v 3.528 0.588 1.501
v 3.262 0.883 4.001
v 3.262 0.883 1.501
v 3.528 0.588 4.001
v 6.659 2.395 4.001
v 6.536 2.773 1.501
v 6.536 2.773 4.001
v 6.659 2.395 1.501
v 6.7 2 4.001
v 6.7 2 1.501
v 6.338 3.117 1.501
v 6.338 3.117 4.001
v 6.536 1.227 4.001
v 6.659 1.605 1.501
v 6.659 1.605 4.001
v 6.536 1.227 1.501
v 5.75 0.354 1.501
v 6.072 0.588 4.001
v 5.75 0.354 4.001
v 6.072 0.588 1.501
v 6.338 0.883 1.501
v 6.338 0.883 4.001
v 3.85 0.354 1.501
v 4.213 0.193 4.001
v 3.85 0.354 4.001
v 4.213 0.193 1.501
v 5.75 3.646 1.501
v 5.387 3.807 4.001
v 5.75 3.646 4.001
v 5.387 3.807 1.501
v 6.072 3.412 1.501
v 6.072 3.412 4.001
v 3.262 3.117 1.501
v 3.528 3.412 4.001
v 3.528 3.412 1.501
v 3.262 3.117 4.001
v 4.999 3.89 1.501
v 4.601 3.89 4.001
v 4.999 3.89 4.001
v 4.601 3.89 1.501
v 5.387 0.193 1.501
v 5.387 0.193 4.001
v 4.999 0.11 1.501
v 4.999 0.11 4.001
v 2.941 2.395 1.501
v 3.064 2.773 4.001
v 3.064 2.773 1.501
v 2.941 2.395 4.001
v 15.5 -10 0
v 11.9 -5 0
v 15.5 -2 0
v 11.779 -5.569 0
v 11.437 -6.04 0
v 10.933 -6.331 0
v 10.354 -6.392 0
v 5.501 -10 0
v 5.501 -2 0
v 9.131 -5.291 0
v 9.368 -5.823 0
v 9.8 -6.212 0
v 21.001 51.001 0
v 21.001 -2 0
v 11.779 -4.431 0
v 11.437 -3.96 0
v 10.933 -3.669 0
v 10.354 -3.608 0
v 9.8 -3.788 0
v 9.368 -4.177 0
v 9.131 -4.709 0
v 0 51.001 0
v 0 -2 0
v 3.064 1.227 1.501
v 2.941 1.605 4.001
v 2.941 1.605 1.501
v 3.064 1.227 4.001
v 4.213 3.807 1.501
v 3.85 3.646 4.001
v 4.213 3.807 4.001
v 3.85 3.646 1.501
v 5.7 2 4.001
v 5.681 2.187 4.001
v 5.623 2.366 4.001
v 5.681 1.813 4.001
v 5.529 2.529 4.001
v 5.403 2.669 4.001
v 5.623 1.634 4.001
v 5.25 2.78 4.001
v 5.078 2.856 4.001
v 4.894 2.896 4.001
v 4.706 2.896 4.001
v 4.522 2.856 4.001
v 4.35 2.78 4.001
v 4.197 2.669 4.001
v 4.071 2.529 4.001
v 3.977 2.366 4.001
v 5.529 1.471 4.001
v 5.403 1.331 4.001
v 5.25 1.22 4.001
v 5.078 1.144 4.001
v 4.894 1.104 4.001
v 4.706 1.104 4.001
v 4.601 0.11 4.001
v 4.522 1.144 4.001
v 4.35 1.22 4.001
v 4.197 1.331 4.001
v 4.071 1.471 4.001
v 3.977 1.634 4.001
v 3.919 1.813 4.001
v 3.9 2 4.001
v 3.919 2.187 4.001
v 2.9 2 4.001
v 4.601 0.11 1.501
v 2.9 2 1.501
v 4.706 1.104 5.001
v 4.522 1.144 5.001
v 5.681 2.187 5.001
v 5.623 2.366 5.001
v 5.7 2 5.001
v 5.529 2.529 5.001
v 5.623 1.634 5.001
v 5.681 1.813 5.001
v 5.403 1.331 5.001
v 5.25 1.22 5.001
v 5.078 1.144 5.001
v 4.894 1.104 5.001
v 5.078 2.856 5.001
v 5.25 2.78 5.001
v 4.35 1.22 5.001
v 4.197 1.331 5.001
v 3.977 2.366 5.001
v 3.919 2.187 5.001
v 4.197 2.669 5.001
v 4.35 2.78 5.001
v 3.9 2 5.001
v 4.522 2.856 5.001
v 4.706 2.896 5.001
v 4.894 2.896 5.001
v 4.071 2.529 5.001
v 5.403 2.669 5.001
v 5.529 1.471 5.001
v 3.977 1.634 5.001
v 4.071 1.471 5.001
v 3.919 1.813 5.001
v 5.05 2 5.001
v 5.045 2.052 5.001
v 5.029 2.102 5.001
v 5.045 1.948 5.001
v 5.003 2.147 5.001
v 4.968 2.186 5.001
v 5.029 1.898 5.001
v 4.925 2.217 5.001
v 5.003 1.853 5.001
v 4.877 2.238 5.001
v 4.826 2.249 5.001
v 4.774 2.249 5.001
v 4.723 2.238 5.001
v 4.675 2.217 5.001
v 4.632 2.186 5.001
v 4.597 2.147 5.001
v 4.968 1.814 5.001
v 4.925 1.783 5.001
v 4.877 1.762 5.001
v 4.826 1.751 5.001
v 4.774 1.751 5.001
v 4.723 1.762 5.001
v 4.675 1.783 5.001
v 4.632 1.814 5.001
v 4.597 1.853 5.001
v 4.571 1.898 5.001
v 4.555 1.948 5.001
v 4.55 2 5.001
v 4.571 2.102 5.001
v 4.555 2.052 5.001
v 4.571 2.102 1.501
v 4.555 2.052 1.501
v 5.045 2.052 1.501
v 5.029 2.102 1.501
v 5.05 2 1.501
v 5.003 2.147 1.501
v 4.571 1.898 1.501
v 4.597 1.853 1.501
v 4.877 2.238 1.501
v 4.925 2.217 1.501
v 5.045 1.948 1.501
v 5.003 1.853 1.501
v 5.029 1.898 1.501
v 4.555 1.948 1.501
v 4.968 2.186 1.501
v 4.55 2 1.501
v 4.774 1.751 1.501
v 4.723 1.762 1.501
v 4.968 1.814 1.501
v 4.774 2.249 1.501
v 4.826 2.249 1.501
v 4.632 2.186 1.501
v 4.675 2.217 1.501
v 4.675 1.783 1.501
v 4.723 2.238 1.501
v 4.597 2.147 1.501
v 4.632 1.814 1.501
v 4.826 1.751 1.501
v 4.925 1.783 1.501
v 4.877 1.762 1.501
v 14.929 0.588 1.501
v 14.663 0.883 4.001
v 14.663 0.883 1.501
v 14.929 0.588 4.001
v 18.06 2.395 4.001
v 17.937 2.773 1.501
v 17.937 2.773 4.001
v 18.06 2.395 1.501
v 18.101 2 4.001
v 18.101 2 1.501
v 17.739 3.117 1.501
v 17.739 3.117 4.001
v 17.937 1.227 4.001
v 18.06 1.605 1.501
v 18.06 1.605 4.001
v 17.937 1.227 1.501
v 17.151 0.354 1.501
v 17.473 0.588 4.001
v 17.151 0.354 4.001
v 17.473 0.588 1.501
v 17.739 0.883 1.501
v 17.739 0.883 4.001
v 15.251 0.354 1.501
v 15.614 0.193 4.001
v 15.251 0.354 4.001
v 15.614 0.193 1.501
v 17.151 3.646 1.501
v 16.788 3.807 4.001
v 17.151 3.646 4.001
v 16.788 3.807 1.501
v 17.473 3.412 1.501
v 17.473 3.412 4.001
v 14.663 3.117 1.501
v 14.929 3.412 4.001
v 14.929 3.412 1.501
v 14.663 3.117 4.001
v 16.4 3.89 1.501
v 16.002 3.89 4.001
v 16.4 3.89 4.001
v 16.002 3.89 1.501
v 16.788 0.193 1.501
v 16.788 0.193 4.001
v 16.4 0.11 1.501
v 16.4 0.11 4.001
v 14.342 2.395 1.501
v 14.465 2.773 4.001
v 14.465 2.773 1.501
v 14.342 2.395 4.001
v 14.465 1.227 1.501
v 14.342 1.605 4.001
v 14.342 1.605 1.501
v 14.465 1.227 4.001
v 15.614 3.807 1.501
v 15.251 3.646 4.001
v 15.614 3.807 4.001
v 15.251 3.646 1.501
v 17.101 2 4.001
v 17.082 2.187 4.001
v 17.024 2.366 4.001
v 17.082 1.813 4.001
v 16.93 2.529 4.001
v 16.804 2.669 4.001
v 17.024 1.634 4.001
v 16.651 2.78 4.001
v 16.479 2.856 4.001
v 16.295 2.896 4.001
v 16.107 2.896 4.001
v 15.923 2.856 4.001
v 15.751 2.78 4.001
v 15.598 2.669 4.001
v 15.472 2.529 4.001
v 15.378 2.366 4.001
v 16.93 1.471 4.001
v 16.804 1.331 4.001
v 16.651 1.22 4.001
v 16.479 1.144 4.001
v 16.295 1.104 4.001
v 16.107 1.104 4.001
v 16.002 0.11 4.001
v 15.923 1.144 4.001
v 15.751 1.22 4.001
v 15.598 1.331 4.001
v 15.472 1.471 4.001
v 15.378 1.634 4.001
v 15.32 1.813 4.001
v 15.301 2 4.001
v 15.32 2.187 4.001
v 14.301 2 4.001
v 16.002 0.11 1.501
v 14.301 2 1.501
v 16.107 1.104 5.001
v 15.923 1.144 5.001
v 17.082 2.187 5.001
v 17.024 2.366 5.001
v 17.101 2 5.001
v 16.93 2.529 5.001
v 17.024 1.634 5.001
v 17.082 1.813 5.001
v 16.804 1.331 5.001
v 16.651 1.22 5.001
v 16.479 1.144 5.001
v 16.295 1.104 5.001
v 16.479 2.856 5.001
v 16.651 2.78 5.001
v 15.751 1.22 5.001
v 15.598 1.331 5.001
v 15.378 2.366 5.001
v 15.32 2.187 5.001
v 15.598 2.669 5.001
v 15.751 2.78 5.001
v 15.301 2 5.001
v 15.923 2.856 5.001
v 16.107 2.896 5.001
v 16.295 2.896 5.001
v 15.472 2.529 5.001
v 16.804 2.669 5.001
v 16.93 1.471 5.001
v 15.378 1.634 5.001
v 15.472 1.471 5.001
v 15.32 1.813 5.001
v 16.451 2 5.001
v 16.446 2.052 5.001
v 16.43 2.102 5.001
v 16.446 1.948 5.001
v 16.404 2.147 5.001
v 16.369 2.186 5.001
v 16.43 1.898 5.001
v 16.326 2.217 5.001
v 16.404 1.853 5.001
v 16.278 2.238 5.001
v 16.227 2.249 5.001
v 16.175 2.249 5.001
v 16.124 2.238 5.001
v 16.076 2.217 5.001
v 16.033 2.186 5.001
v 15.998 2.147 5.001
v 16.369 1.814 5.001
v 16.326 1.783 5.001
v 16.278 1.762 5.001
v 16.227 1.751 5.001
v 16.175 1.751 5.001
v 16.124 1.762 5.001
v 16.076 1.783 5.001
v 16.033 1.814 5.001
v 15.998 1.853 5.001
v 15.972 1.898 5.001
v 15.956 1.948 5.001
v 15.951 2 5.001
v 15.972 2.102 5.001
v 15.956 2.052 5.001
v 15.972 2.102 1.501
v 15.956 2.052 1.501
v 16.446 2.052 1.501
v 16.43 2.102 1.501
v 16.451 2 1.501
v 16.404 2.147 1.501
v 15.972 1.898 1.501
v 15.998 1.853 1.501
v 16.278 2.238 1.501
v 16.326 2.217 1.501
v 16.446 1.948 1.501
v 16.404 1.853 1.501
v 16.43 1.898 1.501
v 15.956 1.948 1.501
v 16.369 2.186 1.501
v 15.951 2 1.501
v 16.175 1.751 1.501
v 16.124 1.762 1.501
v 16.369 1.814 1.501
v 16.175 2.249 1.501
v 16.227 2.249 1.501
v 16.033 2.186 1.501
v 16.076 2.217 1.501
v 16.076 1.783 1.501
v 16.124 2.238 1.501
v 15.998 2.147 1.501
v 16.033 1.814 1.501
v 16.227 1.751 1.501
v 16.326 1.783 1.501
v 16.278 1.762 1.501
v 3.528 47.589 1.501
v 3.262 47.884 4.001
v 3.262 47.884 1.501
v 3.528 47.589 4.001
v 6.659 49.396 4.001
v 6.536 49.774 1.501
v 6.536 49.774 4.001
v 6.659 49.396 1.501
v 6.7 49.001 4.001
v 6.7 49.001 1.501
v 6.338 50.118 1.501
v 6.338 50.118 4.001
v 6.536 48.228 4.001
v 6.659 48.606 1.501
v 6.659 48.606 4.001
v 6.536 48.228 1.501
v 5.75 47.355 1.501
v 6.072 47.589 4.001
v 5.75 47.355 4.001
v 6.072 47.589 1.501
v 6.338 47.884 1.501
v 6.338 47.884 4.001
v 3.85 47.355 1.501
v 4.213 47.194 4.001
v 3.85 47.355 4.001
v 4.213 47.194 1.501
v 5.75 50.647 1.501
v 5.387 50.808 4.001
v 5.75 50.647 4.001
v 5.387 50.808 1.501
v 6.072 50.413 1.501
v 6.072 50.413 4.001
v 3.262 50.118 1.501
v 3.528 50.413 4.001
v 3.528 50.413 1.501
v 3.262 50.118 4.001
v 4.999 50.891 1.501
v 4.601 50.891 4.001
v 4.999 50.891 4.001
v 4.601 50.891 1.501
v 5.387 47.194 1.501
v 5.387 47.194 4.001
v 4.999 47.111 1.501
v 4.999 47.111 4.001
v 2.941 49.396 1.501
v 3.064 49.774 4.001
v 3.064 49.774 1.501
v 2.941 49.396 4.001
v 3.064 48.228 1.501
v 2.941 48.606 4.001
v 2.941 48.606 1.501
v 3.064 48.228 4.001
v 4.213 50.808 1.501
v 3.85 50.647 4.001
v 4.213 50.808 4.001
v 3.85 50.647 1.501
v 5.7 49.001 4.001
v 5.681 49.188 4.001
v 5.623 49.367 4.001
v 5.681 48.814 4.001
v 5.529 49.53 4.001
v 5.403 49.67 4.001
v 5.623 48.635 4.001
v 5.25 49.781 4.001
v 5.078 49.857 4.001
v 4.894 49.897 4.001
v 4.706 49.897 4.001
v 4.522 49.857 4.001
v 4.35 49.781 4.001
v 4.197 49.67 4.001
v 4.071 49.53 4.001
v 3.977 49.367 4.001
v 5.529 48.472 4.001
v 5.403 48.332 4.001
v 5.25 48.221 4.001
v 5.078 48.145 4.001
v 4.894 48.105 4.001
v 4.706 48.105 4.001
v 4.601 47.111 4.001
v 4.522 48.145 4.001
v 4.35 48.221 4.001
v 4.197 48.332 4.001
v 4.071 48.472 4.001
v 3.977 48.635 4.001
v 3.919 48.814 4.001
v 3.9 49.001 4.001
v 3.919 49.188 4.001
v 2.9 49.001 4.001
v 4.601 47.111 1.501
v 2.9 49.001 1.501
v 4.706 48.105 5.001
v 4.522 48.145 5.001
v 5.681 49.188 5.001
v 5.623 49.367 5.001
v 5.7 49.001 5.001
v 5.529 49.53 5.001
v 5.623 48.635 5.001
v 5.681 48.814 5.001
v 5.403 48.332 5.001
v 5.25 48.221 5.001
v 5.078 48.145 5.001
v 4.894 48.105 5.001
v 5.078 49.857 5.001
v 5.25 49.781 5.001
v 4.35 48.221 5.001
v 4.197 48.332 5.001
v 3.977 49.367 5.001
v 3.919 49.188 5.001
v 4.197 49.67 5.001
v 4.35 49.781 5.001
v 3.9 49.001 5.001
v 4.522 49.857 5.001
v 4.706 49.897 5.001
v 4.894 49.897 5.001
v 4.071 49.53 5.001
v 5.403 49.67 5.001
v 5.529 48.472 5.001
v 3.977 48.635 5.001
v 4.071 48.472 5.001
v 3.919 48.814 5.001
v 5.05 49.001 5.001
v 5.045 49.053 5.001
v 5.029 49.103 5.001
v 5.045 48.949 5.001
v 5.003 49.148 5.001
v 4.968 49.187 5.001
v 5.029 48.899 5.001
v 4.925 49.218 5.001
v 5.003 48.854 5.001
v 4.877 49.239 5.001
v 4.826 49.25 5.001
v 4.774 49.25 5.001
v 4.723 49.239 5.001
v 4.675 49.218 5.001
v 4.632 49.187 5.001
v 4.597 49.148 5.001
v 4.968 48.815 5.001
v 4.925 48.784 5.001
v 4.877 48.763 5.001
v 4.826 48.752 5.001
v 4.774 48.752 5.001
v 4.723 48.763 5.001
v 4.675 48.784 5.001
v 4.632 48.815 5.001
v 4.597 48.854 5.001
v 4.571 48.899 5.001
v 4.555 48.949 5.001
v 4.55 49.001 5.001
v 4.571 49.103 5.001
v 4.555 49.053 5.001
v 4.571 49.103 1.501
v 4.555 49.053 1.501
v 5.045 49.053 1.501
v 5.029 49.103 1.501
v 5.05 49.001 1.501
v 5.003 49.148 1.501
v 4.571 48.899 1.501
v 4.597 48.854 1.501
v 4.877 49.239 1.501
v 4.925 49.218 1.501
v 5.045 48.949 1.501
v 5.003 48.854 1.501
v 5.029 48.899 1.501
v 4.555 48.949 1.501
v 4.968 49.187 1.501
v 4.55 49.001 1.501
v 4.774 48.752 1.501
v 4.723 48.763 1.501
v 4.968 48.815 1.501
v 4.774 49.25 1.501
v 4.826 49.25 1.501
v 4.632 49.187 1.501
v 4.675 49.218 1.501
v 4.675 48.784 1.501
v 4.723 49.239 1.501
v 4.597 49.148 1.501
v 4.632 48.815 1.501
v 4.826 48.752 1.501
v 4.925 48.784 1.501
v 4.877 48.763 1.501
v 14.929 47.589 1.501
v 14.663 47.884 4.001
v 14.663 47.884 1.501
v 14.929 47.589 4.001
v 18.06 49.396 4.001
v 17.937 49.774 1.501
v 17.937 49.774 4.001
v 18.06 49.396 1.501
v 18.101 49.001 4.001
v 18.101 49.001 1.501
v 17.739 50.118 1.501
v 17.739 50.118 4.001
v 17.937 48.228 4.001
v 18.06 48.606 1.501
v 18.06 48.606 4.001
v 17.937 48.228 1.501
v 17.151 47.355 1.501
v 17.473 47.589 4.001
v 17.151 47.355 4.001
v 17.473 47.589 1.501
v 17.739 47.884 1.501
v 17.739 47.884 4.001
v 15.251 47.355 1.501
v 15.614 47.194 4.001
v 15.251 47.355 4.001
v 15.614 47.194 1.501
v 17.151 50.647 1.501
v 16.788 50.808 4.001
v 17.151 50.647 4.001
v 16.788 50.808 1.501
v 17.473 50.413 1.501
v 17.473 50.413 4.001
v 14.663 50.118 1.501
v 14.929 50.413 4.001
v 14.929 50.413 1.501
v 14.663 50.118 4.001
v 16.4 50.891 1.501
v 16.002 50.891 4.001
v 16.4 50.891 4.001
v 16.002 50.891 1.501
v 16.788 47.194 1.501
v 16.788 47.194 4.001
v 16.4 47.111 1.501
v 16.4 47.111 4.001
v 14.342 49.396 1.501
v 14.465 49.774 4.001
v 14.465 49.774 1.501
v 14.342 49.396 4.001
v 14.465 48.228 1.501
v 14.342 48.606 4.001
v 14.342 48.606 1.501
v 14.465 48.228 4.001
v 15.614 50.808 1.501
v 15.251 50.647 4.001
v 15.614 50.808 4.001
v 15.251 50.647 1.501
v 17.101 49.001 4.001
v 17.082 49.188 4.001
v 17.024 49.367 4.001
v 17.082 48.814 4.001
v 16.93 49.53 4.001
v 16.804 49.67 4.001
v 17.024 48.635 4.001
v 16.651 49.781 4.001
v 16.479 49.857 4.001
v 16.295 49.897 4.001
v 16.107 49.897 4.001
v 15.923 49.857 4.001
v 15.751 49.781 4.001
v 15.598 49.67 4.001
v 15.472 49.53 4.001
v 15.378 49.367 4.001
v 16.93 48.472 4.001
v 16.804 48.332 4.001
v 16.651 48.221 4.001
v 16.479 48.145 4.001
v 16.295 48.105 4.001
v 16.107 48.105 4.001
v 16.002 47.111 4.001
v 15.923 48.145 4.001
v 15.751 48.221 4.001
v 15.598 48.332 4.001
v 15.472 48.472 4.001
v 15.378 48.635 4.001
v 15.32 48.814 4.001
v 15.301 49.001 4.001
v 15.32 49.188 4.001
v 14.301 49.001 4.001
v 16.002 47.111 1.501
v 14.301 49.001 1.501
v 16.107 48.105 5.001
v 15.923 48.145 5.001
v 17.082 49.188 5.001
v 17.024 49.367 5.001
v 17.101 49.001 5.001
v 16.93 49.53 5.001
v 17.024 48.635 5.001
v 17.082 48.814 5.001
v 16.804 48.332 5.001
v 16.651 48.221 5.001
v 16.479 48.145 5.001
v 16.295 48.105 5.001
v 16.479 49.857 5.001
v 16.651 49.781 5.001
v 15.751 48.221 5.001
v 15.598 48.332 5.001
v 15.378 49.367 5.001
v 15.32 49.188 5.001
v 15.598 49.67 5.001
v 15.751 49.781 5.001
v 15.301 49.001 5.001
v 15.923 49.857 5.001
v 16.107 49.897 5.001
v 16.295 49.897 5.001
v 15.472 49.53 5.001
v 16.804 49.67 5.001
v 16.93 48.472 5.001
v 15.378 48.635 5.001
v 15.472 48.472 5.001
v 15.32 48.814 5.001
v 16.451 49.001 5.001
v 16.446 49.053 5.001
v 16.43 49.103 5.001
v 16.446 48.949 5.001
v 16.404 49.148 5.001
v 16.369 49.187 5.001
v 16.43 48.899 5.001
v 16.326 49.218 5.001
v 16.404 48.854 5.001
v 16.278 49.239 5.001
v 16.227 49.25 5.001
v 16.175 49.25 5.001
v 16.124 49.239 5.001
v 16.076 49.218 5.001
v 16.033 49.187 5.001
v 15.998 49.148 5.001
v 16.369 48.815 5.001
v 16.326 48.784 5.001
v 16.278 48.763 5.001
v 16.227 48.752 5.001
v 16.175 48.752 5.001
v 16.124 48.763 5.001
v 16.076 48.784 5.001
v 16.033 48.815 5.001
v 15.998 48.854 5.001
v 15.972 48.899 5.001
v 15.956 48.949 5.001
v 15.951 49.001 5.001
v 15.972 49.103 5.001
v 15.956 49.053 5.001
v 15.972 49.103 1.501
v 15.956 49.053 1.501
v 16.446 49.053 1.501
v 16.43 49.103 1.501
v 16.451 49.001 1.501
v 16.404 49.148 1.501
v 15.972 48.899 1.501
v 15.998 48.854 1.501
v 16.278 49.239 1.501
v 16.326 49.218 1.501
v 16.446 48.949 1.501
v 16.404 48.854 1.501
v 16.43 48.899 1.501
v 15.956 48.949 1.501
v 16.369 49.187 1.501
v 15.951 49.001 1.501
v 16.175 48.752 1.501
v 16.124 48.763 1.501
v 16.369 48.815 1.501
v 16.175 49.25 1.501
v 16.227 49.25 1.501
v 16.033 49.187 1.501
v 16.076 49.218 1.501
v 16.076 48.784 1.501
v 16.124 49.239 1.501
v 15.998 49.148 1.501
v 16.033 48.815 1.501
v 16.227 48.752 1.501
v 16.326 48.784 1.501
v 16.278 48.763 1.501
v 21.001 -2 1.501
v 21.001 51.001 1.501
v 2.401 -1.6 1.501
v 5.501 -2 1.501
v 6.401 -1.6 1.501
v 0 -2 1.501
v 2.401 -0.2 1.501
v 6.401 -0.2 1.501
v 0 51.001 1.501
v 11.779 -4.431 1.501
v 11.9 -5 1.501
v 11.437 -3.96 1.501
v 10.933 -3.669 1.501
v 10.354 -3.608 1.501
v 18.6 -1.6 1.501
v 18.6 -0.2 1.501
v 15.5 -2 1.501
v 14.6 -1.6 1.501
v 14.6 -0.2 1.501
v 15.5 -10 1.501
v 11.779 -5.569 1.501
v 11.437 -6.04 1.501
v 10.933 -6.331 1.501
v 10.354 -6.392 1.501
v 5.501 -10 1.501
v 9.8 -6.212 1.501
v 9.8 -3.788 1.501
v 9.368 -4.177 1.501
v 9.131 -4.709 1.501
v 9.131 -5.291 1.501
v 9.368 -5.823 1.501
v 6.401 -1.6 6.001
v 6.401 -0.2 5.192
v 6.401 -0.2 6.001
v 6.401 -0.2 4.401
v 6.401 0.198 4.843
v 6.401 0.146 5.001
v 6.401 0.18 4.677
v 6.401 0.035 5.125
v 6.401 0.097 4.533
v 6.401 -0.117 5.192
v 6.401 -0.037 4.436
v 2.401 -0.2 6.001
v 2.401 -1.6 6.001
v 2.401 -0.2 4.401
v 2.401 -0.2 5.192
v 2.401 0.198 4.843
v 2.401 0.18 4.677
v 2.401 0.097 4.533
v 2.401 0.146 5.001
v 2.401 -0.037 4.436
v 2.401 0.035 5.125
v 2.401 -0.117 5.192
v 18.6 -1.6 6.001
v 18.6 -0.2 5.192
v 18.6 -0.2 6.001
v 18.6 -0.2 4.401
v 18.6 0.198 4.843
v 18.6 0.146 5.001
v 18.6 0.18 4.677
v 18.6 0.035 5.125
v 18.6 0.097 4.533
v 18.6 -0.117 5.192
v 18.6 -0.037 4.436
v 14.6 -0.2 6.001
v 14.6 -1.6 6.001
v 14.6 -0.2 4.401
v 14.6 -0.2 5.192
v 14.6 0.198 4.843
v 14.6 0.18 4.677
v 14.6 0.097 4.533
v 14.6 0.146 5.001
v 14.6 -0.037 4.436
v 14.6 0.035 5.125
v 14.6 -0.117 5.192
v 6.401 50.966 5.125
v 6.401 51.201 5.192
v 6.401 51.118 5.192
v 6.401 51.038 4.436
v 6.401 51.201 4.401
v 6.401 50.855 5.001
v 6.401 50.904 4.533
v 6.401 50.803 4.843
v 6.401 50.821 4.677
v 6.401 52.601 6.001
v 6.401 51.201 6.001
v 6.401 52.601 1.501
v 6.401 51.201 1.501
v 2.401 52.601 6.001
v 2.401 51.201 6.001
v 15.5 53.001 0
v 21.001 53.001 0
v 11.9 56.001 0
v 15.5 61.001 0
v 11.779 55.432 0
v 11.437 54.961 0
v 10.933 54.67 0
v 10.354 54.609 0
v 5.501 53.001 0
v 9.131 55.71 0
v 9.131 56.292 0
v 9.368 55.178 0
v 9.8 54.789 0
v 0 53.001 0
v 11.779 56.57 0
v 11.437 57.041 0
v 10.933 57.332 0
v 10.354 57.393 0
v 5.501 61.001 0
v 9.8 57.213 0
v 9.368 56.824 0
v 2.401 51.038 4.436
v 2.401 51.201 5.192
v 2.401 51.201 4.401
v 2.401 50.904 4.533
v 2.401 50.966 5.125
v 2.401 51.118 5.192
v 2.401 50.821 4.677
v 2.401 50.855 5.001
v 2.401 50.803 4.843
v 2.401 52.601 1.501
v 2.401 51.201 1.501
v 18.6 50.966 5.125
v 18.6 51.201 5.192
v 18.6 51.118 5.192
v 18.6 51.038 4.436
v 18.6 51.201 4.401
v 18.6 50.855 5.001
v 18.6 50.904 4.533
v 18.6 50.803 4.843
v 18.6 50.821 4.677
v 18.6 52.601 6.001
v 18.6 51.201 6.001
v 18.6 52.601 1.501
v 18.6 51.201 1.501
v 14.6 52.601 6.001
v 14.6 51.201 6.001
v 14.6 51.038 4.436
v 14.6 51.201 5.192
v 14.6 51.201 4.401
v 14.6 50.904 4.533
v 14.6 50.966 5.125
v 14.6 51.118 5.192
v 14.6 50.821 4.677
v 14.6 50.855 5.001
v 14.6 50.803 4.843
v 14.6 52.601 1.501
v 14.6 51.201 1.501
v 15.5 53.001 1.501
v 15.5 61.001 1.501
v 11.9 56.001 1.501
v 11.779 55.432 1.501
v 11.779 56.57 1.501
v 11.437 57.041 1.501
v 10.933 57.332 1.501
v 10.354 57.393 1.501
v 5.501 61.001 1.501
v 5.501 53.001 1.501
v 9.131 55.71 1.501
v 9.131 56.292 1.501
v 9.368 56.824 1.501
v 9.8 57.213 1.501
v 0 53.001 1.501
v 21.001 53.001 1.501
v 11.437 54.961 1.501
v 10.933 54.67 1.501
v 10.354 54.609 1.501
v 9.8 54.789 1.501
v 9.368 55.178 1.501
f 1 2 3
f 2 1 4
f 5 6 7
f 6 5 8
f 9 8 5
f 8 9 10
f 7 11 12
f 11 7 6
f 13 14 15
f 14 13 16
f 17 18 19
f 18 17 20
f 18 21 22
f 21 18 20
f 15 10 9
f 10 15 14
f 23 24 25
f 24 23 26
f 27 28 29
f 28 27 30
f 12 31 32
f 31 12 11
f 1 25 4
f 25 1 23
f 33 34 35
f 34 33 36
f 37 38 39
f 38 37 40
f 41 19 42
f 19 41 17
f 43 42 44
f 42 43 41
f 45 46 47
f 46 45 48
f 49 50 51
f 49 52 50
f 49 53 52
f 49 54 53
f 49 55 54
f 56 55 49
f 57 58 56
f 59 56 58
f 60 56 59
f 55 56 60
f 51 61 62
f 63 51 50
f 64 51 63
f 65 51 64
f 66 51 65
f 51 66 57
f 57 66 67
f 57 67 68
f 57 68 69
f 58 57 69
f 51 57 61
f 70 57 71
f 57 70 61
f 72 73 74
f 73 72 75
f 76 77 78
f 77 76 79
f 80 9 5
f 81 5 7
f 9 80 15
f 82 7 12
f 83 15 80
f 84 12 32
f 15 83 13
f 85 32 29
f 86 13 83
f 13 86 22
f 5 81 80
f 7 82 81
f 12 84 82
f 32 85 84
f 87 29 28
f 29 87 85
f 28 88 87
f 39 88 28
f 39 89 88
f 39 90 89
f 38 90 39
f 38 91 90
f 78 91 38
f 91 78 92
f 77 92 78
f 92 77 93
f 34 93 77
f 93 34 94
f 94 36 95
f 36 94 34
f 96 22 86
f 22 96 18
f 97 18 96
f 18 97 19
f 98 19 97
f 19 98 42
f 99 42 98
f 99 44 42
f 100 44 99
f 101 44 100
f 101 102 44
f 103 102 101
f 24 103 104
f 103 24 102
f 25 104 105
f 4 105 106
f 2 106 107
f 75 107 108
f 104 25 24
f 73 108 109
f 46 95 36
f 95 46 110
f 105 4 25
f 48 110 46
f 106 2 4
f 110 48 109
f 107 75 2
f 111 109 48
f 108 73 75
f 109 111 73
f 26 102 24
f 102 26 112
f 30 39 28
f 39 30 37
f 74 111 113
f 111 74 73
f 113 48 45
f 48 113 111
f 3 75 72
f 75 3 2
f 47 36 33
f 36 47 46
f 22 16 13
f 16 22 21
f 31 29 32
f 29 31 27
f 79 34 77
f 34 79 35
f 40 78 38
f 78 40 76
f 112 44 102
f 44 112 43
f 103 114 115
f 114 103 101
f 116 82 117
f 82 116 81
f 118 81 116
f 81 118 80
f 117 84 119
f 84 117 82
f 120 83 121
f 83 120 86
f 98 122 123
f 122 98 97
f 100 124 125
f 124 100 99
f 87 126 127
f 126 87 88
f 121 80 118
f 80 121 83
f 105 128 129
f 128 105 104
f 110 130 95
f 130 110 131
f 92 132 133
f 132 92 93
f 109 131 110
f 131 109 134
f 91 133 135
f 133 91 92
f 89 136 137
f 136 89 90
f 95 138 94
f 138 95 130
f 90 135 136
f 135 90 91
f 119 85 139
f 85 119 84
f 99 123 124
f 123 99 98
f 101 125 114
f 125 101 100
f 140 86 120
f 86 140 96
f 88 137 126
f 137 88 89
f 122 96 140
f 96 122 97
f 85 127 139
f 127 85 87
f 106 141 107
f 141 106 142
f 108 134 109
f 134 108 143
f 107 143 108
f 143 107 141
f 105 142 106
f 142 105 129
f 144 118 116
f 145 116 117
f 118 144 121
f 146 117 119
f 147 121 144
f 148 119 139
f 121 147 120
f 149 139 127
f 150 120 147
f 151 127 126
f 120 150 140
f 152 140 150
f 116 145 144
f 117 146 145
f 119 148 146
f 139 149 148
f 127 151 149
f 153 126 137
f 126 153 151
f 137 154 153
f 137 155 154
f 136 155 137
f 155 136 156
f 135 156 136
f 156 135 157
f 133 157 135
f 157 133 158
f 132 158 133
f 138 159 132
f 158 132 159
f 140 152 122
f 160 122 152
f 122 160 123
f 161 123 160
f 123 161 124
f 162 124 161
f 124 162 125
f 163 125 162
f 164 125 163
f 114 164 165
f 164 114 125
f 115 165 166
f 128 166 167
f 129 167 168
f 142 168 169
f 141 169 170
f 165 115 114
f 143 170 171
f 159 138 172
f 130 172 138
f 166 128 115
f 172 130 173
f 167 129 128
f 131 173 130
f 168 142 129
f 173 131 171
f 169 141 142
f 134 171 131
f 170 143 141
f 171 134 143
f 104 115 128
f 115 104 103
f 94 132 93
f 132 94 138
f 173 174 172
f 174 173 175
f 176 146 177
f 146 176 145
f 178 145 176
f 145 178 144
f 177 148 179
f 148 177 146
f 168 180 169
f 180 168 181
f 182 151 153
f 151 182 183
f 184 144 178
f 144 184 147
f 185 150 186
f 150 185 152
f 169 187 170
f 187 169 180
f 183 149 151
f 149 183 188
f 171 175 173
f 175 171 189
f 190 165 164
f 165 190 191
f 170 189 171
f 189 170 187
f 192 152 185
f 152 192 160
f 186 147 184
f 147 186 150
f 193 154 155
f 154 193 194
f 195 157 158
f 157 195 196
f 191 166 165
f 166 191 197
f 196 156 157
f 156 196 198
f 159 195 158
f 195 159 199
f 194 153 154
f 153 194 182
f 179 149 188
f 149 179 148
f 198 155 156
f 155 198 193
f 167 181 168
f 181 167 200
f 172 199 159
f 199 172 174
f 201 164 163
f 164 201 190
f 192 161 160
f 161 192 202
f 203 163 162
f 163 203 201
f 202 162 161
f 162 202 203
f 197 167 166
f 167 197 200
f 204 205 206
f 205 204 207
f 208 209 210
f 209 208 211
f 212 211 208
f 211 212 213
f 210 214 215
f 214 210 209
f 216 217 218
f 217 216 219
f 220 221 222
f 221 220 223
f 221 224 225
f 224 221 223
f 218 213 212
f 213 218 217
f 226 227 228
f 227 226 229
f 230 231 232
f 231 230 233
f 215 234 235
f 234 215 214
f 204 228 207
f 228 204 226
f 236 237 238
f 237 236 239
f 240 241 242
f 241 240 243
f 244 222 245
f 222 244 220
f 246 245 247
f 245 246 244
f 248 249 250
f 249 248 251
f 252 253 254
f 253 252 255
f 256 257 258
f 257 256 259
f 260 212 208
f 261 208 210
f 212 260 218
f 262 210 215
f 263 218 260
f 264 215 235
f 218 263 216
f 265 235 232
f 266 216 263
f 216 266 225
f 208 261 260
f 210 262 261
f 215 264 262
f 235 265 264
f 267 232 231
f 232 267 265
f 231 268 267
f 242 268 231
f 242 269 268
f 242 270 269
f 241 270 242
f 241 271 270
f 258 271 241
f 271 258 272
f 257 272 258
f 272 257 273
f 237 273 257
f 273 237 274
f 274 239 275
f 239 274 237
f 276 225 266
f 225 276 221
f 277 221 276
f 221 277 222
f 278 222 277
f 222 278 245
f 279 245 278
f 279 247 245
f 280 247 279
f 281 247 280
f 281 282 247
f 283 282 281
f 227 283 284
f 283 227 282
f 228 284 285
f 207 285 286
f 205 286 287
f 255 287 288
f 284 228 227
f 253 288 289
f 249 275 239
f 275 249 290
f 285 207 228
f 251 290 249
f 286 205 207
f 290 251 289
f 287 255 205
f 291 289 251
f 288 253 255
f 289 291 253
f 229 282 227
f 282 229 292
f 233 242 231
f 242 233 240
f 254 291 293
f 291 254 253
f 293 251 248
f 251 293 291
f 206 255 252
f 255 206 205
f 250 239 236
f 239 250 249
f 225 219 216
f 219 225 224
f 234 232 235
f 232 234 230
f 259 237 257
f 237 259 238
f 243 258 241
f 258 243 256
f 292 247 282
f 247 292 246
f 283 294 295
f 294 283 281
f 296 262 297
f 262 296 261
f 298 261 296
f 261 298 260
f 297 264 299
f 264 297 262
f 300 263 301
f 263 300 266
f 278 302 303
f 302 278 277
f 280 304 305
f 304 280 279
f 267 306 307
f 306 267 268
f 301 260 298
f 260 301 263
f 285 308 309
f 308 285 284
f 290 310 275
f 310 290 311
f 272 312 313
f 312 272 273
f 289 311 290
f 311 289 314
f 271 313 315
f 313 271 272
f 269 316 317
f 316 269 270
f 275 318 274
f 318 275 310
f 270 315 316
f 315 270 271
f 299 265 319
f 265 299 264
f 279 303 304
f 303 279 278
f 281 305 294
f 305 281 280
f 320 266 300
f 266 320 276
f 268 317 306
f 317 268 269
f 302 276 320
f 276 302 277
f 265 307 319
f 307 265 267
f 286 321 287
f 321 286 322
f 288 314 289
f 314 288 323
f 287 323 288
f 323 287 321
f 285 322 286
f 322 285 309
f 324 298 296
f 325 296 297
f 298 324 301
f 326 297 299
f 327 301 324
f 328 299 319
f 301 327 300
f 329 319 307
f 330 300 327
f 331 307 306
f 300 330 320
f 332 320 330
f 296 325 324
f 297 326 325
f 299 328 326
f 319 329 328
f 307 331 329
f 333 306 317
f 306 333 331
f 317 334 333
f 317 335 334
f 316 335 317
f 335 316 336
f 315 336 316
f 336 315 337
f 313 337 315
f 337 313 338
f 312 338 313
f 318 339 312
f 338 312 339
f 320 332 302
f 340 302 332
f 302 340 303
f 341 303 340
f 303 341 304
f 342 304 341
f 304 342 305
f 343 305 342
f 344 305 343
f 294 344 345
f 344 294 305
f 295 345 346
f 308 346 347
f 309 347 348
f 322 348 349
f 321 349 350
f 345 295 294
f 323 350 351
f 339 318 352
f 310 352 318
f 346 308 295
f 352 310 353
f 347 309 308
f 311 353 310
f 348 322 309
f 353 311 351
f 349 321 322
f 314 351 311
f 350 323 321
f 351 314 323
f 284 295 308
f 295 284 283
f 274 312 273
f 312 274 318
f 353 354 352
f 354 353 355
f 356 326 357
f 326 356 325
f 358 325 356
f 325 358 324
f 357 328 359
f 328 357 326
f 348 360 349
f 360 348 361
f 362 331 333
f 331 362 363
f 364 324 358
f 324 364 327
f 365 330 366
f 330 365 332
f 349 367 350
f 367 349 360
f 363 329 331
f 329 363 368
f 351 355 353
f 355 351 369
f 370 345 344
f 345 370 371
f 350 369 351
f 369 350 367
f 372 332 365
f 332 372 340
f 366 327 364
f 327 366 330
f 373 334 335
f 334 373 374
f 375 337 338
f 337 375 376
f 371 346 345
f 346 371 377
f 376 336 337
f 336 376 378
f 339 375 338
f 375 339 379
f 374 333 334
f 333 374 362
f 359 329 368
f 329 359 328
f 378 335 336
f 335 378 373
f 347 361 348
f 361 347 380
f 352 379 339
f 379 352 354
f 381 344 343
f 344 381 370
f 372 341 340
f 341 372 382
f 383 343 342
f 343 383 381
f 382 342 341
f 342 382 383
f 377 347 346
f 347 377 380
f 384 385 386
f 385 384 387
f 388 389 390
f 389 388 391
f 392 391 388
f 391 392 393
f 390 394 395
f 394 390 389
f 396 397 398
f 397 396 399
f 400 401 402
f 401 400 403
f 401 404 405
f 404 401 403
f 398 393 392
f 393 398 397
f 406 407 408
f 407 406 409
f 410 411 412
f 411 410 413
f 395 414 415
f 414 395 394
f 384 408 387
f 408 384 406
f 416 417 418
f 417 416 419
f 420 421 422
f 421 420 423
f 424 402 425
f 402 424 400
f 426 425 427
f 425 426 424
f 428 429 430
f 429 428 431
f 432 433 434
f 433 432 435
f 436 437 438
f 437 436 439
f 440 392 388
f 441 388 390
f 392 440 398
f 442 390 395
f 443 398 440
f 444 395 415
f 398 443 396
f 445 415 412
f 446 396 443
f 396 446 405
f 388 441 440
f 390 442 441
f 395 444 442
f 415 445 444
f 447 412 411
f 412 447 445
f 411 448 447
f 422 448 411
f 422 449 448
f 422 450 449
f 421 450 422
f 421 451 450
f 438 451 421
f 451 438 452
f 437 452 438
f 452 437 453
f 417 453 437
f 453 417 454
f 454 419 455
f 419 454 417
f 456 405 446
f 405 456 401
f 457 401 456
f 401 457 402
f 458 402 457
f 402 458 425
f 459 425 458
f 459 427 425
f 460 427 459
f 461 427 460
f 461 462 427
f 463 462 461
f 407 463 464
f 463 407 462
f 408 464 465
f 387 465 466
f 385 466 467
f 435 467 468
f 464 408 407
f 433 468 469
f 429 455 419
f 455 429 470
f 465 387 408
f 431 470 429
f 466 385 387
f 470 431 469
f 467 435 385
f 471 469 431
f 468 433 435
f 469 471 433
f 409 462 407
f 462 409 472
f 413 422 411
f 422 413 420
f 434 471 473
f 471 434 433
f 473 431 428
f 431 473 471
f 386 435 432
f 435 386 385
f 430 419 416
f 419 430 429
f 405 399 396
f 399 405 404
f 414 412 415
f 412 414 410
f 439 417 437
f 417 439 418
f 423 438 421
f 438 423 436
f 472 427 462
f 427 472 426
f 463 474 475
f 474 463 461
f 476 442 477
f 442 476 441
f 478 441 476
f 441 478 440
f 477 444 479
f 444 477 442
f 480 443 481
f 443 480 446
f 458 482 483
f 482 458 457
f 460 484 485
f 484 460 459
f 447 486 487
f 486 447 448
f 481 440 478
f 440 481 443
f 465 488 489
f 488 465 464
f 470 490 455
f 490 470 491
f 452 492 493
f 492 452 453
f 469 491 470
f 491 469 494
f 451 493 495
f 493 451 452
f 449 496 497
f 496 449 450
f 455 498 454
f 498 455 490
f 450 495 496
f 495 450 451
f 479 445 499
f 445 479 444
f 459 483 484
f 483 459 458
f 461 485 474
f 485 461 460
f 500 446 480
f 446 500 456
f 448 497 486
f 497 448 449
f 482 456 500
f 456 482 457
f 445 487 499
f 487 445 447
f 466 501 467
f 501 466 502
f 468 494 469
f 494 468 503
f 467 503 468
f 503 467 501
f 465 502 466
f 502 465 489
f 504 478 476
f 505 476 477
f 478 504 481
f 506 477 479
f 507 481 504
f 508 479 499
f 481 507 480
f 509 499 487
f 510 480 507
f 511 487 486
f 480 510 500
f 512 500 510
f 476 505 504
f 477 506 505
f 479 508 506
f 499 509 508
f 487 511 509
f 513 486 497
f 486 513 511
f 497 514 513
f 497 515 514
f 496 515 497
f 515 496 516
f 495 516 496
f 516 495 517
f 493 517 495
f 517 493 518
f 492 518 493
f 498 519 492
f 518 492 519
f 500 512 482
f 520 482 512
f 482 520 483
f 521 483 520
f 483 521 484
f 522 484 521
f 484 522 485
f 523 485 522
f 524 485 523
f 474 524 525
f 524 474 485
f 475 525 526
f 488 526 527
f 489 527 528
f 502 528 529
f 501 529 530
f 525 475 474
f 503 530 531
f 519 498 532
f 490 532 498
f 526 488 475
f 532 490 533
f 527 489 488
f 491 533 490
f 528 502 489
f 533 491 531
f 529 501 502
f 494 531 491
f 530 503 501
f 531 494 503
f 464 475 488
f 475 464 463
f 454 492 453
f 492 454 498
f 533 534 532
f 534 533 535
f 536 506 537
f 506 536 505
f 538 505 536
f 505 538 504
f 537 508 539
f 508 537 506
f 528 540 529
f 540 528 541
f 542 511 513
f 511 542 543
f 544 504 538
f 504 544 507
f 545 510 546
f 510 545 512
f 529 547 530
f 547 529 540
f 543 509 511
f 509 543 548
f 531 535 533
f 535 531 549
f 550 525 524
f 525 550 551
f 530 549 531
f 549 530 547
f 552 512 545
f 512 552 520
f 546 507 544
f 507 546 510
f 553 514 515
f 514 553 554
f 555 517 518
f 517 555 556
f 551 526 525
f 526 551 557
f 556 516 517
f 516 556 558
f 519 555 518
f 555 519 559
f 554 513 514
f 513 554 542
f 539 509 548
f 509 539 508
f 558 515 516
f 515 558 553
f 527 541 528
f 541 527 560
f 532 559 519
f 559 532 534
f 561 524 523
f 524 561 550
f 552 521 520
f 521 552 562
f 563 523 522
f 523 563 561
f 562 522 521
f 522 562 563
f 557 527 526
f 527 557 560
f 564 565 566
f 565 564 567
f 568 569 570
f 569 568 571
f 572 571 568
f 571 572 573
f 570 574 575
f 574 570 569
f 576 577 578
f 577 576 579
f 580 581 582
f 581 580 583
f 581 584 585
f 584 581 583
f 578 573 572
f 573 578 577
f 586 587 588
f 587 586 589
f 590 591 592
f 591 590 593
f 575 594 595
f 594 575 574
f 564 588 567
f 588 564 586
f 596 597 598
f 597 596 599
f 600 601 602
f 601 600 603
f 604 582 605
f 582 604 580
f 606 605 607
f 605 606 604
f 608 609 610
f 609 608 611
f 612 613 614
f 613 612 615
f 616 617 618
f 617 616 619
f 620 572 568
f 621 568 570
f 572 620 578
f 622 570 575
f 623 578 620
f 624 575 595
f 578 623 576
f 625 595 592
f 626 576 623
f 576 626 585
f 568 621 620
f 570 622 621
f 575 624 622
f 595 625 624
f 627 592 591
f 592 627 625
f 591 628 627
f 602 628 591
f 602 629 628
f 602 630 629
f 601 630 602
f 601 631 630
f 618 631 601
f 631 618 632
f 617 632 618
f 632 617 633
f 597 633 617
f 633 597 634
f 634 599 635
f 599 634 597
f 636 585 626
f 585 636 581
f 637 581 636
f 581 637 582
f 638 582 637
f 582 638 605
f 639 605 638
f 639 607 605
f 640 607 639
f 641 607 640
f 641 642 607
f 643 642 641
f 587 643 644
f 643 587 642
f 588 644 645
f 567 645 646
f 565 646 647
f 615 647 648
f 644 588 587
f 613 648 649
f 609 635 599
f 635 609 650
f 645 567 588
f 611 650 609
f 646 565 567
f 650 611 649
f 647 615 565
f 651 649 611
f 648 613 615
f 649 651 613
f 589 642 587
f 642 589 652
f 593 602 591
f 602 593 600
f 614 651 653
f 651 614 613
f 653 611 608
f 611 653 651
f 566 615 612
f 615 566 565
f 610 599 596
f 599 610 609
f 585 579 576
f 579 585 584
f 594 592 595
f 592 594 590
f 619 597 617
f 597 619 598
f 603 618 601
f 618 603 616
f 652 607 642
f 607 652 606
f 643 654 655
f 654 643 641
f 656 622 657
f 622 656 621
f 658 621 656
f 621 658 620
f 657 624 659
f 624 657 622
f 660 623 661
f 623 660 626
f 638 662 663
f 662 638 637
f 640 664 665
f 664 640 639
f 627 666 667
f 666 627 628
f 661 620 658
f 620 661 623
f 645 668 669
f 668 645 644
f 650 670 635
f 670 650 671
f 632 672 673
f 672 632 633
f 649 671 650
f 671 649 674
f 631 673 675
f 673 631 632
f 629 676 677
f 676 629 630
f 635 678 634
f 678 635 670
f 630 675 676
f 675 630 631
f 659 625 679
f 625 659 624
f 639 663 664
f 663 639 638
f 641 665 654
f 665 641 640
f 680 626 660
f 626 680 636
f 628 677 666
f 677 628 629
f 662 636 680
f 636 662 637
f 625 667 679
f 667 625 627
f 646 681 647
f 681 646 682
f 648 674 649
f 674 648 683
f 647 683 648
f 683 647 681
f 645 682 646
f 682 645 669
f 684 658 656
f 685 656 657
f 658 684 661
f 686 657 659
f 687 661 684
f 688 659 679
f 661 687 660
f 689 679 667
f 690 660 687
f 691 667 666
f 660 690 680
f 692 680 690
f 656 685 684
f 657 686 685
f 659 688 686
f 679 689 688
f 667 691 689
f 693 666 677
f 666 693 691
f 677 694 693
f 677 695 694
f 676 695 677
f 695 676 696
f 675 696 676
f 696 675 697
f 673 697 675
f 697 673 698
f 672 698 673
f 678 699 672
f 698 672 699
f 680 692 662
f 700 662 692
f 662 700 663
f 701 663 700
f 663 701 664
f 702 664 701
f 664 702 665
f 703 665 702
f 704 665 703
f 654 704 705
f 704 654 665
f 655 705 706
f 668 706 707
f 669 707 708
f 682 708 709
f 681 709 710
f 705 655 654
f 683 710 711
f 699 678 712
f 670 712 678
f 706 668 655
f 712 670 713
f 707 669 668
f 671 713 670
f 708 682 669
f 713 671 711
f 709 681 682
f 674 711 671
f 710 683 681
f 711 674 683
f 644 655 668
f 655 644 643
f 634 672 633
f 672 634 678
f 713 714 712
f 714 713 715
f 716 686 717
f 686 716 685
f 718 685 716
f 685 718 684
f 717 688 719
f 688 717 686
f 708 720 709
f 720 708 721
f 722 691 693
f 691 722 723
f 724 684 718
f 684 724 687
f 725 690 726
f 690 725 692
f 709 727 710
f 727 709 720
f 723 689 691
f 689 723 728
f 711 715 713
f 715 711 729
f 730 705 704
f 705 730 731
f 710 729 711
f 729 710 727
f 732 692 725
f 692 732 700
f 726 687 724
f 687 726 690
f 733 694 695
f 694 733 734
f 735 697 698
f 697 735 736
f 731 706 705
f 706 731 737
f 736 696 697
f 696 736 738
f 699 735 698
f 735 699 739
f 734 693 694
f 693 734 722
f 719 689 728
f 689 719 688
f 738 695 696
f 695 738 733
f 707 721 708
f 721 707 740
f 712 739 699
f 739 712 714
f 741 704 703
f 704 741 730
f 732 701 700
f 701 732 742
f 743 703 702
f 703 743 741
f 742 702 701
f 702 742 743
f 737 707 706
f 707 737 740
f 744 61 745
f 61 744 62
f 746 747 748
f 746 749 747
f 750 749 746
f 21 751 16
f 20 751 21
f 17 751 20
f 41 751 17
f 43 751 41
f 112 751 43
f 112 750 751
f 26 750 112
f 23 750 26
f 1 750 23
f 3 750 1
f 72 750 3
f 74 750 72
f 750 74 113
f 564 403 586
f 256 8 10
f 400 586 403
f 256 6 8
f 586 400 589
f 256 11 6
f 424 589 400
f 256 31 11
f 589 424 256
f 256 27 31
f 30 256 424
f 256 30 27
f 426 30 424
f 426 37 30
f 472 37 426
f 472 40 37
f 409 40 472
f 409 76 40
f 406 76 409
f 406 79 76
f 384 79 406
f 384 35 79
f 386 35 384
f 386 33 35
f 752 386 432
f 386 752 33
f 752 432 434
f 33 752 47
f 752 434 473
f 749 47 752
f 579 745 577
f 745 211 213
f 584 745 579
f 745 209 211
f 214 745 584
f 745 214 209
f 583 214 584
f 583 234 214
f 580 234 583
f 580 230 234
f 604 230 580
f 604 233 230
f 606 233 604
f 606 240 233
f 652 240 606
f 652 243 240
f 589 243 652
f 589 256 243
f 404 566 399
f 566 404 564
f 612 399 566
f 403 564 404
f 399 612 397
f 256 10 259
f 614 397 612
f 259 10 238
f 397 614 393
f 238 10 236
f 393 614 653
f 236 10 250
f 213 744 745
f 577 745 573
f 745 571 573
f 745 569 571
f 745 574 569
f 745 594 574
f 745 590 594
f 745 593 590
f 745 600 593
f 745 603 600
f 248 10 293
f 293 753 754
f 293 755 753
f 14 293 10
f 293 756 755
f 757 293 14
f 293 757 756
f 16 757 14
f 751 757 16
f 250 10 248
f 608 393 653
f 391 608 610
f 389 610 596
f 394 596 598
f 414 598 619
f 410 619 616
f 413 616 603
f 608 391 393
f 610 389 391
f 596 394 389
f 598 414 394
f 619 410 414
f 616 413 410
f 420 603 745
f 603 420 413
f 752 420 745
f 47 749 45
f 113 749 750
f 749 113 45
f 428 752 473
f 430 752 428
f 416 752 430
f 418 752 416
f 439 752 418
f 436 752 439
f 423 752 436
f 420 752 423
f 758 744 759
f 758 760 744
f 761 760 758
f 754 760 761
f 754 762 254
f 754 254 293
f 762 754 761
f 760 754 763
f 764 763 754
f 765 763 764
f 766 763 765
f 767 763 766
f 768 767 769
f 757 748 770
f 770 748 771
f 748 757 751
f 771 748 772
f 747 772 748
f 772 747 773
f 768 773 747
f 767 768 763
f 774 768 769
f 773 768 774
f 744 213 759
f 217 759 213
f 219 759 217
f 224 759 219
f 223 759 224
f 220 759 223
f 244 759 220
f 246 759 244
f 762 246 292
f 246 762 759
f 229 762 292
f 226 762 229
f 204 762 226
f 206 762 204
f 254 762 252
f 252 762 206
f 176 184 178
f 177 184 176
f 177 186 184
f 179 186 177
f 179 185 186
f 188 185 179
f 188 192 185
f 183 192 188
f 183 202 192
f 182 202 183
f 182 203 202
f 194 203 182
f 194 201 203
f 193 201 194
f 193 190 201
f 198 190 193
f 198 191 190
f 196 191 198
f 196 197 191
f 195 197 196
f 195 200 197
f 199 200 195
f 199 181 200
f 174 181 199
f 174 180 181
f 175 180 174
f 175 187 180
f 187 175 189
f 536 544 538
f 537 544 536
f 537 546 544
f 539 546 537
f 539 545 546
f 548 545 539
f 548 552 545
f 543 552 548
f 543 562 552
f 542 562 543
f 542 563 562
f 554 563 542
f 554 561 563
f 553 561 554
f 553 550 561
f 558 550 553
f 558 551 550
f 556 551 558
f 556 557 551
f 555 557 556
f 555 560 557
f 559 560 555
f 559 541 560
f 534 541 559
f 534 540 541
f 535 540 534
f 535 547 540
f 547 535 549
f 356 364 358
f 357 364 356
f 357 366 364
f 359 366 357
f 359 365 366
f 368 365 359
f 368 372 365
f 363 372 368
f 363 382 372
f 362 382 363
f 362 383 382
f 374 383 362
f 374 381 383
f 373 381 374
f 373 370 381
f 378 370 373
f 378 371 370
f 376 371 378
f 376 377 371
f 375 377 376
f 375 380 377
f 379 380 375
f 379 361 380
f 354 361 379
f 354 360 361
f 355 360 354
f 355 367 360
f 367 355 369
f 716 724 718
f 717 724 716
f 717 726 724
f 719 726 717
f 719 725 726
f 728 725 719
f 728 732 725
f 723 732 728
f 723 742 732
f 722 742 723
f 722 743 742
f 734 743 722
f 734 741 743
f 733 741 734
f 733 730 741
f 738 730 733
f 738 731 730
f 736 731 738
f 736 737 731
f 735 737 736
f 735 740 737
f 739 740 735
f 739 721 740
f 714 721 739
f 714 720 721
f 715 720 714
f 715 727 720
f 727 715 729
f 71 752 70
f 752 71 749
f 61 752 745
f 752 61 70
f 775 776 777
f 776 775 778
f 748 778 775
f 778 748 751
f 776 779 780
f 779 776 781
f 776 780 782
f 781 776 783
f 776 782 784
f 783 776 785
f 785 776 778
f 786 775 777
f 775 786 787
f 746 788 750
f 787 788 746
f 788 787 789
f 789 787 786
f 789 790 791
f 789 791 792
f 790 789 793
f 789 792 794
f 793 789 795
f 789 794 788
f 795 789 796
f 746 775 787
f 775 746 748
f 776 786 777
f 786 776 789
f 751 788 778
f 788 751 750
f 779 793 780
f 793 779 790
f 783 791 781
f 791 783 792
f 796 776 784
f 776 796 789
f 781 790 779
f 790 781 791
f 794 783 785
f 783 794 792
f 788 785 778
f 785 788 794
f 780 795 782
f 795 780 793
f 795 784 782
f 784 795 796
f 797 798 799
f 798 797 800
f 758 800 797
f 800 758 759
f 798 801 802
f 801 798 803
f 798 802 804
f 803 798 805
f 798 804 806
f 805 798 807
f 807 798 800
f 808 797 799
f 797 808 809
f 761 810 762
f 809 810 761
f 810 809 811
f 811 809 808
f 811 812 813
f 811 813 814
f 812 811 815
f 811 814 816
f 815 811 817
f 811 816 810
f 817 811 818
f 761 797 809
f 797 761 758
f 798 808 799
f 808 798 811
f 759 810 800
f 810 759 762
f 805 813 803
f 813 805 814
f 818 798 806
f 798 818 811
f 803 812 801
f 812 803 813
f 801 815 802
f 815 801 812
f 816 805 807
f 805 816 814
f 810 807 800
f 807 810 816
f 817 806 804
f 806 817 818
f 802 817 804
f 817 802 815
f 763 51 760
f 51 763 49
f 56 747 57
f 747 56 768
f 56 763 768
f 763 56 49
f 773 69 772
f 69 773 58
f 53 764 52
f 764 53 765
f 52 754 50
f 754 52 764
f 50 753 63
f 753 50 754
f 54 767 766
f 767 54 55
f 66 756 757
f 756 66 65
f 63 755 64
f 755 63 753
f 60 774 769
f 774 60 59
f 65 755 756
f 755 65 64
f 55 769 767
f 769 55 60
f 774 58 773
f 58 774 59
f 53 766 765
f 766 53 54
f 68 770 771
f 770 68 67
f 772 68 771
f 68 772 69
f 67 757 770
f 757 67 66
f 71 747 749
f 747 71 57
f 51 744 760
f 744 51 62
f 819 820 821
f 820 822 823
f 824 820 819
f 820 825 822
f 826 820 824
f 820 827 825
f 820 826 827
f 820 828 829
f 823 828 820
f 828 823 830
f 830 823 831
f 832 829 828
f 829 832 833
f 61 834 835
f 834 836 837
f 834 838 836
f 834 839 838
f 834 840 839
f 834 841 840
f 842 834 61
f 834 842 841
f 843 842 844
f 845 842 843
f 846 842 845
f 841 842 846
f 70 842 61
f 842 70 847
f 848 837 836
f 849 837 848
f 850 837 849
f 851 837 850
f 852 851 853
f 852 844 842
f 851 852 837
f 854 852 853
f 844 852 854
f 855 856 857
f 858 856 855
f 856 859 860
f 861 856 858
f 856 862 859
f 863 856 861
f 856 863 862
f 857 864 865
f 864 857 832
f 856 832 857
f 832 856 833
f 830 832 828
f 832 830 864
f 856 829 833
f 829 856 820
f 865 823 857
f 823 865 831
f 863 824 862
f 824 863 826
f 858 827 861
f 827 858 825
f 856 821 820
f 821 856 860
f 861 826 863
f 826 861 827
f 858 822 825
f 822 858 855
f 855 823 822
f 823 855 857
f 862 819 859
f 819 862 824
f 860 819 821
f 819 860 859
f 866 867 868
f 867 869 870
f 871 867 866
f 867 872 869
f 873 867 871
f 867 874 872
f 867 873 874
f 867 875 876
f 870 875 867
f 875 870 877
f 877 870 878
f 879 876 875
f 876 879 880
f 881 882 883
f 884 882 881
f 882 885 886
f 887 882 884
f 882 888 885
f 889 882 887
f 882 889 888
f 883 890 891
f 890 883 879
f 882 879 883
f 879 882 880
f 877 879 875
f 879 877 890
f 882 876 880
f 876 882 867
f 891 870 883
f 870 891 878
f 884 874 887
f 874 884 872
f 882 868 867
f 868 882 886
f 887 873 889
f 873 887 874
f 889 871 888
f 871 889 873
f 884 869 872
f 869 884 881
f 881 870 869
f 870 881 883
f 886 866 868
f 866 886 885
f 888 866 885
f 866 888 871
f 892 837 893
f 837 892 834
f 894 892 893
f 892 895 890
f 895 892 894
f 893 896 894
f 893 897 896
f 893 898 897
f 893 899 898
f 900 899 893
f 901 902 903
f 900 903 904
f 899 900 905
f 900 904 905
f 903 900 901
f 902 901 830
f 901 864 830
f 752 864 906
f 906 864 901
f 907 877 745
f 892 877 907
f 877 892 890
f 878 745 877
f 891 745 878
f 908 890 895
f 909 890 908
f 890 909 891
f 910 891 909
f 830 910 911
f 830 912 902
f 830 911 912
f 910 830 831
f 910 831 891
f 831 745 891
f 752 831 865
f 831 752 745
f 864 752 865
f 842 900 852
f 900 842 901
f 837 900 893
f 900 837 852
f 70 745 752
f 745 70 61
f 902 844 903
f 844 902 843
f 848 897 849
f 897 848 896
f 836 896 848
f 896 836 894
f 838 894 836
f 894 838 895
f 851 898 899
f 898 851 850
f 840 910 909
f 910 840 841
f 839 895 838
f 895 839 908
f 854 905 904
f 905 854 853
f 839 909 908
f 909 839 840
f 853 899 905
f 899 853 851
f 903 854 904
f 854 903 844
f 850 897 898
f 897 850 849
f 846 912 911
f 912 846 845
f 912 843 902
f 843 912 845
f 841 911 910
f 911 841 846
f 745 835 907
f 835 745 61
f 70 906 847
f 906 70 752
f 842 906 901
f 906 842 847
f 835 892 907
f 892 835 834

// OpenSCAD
width = 21.001;
height = 51.001;
thickness = 1.501;

bolt_delta_x = 11.401;
bolt_delta_y = 47.001;
bolt_diameter = 1.801;
bolt_screw = 0.501;

snap_delta = 2.401;

module snap(latch=true)
{
    cube([width, 2.0, thickness]);
    translate([snap_delta, 0.2, 0]) {
        cube([4, 1.4, thickness + 2.5 + 2.0]);
        translate([0, 0, thickness + 3.3])
            rotate([0, 90, 0])
                cylinder($fn=15, d=0.8, h=4);
    };
    translate([width - snap_delta - 4.0, 0.2, 0]) {
        cube([4, 1.4, thickness + 2.5 + 2.0]);
        translate([0, 0, thickness + 3.3])
            rotate([0, 90, 0])
                cylinder($fn=15, d=0.8, h=4);
    }
    if (latch) {
        translate([width / 2 - 5.0, 0, 0])
            difference() {
                cube([10.0, 10.0, thickness]);
                translate([5.0, 5.0, -1]) cylinder($fn=15, d=2.8, h=thickness + 2);
            }
    }
}

module bolt()
{
    difference(){
        union(){
            cylinder($fn=30, d=bolt_diameter + 2.0, h=thickness + 2.5);
            cylinder($fn=30, d=bolt_diameter , h=thickness + 2.5 + 1.0);
        }
        translate([0.0, 0.0, -1.0])
            cylinder($fn=30, d=bolt_screw, h=thickness + 2.5 + 1.0 + 2.0);
    }
}

module bolting()
{
    translate([(width - bolt_delta_x) / 2.0,
               (height - bolt_delta_y) / 2.0, 0]) bolt();
    translate([(width + bolt_delta_x) / 2.0,
               (height - bolt_delta_y) / 2.0, 0]) bolt();
    translate([(width - bolt_delta_x) / 2.0,
               (height + bolt_delta_y) / 2.0, 0]) bolt();
    translate([(width + bolt_delta_x) / 2.0,
               (height + bolt_delta_y) / 2.0, 0]) bolt();
}

module baseplate()
{
    cube([width, height, thickness]);
    bolting();
}

baseplate();
mirror([0,1,0]) snap();
translate([0.0, height, 0.0]) snap();
